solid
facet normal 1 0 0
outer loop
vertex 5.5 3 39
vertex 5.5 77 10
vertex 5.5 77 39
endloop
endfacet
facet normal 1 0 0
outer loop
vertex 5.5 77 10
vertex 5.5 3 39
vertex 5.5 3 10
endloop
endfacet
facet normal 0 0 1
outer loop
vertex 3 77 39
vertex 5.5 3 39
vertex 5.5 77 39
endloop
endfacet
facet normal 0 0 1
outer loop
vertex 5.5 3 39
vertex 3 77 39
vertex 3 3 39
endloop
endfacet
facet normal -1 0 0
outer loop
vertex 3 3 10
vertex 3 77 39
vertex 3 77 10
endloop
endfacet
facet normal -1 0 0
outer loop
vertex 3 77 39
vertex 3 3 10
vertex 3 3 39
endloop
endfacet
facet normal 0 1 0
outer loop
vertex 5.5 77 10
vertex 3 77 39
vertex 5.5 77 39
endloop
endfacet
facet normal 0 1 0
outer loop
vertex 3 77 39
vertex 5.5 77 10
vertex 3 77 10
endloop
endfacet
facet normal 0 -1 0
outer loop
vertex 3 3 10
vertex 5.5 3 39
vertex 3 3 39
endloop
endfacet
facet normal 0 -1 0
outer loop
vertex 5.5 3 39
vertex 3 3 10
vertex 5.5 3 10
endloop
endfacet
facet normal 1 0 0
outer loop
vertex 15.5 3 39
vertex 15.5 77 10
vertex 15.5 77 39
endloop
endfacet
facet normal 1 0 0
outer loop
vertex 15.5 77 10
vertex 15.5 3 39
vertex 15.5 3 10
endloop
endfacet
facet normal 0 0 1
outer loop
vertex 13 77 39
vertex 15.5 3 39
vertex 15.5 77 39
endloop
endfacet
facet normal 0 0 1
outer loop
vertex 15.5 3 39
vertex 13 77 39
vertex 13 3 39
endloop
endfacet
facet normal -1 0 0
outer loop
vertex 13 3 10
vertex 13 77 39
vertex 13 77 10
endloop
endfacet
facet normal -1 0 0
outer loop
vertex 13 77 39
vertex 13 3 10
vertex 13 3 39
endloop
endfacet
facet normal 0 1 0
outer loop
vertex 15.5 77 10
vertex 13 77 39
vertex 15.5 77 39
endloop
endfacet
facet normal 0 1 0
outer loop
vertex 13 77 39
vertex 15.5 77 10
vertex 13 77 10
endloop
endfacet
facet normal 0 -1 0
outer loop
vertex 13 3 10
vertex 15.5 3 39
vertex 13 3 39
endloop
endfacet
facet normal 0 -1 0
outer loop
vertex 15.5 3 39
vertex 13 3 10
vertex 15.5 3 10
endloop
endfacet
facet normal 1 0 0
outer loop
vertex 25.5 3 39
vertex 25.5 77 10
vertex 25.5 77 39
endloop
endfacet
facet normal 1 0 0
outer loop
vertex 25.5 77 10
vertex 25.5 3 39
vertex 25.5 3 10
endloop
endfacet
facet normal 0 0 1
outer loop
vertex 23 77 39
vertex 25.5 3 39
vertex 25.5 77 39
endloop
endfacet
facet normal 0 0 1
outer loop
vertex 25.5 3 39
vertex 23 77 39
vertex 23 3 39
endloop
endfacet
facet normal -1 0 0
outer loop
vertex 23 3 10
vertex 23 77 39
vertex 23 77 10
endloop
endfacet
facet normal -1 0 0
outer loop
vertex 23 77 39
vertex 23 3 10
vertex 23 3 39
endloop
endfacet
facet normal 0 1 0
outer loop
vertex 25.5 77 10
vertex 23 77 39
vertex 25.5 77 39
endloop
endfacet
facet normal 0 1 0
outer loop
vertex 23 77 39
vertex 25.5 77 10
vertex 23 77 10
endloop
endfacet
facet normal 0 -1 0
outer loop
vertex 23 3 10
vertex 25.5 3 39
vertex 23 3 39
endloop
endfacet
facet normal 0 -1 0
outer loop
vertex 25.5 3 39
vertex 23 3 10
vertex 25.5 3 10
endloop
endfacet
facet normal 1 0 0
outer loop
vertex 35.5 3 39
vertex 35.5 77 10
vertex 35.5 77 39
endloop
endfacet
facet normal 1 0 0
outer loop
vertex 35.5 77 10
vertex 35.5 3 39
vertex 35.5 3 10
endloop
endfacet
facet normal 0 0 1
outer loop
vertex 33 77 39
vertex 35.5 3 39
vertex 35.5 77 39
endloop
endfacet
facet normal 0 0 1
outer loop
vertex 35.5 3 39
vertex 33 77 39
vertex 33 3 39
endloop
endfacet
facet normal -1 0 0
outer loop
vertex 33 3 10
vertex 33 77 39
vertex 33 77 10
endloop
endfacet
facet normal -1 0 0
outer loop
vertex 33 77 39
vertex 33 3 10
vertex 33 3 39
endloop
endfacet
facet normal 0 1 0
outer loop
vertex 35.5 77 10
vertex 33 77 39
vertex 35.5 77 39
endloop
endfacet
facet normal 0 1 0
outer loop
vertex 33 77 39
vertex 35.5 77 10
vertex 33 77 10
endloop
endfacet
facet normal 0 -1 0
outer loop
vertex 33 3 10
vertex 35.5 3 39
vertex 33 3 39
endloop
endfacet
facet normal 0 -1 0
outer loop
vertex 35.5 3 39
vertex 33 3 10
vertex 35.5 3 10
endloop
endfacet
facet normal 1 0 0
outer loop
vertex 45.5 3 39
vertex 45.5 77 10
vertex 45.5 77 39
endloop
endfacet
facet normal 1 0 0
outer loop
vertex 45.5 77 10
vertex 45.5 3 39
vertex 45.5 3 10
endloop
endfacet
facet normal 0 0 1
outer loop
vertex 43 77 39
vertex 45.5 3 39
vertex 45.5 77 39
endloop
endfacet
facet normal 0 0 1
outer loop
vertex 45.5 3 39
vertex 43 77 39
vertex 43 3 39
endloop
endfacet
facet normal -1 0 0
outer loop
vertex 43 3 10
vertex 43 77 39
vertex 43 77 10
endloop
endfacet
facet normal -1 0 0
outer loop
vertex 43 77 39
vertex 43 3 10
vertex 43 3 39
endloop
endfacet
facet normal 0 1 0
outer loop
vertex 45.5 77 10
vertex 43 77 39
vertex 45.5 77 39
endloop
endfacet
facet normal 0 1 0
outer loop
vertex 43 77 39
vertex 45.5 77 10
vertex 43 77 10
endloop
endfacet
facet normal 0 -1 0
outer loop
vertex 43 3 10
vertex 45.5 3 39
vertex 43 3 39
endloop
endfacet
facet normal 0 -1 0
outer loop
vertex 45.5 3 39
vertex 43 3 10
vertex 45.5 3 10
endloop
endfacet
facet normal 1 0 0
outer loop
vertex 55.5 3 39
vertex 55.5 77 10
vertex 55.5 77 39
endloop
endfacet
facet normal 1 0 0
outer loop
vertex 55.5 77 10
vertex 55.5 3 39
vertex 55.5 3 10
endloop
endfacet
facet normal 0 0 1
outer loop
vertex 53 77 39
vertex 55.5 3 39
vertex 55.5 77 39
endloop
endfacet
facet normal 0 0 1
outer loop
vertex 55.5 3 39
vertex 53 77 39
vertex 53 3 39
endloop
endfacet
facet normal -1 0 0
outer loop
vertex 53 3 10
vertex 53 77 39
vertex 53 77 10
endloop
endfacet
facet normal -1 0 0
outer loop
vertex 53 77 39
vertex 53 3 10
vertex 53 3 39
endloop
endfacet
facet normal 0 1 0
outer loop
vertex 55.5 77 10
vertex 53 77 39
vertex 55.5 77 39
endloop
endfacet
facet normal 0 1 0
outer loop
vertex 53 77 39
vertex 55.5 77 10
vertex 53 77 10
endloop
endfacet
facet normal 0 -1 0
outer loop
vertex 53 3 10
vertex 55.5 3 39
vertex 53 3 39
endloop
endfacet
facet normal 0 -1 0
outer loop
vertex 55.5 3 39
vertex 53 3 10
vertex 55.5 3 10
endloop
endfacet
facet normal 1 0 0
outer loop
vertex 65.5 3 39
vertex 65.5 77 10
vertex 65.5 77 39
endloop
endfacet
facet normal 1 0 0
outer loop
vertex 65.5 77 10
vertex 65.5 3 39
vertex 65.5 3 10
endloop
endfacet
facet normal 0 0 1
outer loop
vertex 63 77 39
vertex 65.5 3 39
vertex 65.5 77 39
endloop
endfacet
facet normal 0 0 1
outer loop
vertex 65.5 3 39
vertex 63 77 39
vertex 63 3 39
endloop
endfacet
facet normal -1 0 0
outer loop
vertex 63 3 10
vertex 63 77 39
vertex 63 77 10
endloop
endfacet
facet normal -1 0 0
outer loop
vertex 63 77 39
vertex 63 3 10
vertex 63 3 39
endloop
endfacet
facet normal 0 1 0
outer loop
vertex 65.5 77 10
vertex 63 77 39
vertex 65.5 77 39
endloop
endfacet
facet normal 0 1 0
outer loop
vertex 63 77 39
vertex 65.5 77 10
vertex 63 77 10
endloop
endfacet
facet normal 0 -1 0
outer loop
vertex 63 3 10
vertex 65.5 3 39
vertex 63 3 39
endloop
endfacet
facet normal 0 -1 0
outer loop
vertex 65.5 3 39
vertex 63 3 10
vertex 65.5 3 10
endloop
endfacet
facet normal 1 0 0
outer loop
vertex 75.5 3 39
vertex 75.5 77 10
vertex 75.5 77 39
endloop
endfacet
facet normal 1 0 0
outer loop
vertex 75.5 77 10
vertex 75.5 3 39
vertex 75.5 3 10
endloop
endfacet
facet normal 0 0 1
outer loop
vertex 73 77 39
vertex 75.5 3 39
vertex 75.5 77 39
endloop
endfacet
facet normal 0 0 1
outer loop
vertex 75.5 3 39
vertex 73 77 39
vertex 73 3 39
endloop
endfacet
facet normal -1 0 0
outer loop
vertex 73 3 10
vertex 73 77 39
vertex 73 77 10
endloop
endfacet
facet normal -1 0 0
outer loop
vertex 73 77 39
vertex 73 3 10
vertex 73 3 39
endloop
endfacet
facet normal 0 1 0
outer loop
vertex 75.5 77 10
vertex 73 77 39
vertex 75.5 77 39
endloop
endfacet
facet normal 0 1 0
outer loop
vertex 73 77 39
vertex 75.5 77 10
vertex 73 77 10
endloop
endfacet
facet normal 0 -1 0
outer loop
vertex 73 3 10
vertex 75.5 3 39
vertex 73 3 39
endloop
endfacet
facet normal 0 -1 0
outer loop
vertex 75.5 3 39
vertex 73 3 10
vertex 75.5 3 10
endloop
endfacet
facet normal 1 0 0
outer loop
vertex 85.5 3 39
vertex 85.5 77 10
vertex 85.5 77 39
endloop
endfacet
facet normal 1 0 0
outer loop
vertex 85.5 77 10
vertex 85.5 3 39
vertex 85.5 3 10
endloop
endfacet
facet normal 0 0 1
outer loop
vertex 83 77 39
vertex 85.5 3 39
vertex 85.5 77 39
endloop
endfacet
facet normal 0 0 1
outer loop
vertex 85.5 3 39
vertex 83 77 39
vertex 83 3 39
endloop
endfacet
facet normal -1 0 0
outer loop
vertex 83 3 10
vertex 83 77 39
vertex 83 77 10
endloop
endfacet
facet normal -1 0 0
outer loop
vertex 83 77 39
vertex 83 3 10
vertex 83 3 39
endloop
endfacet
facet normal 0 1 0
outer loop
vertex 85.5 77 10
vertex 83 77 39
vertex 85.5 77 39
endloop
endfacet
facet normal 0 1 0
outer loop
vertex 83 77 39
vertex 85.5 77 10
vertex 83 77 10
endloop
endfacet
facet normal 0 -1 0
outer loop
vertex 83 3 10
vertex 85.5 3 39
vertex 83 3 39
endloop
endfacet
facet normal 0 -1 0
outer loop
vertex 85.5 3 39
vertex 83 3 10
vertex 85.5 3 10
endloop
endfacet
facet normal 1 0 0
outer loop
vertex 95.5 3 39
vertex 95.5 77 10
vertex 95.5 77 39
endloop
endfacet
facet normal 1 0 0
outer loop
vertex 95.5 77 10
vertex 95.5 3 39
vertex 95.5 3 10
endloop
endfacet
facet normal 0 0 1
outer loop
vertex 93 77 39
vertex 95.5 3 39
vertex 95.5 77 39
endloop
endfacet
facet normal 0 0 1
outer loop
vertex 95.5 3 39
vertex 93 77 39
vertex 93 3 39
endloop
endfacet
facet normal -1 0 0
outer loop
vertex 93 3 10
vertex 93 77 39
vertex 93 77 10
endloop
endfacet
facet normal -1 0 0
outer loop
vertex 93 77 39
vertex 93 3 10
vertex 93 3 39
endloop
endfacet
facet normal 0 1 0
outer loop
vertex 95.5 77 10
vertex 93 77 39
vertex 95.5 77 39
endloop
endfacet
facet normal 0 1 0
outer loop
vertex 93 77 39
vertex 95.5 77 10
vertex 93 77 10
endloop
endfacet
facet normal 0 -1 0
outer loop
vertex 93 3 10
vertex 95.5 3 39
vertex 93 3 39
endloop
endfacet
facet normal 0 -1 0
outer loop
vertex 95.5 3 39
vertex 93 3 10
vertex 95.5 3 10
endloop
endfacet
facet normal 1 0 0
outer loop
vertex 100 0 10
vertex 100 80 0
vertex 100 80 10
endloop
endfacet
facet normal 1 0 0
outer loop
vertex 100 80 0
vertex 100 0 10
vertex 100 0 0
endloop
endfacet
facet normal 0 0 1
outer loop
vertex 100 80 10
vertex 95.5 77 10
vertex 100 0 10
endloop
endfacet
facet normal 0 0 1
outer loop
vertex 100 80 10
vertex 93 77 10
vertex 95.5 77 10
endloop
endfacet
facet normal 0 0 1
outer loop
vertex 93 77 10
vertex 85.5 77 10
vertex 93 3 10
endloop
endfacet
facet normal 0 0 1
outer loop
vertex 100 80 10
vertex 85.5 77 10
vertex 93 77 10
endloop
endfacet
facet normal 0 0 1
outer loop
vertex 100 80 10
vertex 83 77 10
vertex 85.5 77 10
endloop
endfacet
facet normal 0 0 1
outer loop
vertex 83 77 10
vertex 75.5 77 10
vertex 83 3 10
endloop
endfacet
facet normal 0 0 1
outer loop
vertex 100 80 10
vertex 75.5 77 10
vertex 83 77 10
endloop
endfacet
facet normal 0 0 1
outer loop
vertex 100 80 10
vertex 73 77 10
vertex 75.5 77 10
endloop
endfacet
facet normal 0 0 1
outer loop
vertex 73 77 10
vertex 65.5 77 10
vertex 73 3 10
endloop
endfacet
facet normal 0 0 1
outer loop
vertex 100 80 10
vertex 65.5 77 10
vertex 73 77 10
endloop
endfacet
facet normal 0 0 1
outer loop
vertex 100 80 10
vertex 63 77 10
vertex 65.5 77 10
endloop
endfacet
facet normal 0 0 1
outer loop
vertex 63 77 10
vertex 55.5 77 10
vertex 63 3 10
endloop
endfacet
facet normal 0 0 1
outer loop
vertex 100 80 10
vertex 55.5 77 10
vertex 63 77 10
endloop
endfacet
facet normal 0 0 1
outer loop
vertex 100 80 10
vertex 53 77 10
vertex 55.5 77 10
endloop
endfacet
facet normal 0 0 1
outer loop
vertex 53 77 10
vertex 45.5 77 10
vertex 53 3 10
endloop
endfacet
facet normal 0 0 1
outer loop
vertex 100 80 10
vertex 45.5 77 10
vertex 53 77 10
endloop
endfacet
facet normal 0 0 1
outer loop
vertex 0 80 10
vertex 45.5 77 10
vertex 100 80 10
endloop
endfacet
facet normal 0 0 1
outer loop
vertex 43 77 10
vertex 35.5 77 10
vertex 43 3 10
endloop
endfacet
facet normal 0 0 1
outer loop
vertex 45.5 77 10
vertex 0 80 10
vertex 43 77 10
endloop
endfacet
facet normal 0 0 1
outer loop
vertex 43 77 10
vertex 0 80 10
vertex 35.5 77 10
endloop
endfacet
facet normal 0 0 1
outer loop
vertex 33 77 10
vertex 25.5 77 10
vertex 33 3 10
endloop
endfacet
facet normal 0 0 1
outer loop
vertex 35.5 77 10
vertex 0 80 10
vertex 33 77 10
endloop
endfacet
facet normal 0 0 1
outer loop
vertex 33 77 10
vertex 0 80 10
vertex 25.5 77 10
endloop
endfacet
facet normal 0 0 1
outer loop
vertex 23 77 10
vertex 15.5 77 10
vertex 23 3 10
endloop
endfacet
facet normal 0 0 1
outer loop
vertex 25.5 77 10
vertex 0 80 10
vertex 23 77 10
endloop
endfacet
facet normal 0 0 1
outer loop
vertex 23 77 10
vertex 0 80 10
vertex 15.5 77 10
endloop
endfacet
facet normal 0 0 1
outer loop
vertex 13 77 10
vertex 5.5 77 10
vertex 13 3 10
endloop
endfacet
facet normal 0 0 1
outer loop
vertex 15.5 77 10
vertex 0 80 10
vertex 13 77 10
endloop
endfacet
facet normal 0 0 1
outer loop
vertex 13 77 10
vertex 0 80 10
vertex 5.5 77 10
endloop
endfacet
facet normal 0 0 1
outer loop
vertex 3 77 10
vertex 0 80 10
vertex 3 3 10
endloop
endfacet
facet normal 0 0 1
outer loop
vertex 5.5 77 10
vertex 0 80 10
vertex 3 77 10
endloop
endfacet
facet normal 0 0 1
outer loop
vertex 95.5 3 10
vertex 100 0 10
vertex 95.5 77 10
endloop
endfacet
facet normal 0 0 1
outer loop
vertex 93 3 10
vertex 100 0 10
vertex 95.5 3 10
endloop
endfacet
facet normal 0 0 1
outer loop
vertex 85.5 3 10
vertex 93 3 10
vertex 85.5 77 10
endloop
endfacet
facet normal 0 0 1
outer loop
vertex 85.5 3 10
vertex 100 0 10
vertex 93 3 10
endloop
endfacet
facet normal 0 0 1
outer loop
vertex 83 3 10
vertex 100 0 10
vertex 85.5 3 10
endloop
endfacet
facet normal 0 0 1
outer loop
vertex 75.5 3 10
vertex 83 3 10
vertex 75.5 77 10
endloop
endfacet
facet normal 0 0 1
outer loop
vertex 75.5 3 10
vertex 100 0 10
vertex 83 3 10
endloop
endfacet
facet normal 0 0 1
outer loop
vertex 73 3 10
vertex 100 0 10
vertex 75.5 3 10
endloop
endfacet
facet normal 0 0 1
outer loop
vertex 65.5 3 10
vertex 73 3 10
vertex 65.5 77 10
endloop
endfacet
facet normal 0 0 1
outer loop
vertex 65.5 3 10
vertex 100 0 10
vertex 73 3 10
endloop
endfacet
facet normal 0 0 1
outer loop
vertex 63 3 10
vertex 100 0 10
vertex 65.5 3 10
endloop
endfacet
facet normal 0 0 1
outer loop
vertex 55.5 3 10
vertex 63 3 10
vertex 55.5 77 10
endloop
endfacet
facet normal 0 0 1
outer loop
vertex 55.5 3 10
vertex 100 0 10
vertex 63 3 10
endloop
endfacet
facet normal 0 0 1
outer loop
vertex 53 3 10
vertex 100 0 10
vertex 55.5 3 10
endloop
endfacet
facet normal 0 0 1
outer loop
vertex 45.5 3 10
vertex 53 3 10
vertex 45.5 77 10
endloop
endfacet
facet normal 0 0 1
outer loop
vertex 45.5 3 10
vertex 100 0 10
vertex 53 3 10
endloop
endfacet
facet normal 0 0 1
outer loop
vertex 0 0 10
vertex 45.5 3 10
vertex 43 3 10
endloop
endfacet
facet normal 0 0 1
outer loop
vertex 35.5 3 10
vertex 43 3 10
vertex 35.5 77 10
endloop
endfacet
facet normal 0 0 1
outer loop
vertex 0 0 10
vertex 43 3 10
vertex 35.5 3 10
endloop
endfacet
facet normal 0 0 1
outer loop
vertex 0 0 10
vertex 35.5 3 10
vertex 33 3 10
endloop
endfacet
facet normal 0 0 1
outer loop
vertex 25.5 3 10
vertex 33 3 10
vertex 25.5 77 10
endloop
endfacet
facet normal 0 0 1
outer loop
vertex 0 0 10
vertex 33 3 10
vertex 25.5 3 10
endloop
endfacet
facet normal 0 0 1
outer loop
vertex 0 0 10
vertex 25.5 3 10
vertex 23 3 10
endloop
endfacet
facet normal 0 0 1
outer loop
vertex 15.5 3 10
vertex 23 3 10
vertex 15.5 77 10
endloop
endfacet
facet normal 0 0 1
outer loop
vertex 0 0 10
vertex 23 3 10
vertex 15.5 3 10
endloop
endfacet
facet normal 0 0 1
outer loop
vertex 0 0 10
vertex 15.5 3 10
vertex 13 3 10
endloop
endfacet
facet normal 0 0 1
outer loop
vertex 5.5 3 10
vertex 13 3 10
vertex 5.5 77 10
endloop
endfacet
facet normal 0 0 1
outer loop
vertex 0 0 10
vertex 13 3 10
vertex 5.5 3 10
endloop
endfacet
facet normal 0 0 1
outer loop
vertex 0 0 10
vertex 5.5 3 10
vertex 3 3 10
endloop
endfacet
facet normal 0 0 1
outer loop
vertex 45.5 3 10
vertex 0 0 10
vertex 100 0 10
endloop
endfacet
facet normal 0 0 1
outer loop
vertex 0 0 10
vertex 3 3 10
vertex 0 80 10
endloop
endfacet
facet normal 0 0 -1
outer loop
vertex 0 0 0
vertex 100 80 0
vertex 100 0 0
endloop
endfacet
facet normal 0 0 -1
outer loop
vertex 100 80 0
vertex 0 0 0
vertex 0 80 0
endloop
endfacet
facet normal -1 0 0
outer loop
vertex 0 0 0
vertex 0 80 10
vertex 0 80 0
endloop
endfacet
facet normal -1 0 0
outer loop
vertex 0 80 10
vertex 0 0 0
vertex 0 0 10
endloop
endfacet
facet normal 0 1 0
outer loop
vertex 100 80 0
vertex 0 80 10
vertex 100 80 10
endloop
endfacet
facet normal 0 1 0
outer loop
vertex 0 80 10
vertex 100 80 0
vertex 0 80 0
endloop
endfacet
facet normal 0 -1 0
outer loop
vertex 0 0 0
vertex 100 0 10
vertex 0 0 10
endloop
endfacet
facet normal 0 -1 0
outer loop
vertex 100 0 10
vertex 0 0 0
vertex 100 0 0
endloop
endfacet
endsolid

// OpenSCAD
$fn = 32;

// ----------------------------------------------------------------------
// Heatsink: uniform fin block
// ----------------------------------------------------------------------

// --- parameters (mm) ---
base_l = 100;             // base length, X
base_w = 80;              // base width, Y
base_t = 10;              // base plate thickness
fin_h = 30;               // fin height above the base
fin_t = 2.5;              // fin thickness
edge = 3;                 // margin from the base ends
pitch = 10;               // fin pitch

n_fins = floor((base_l - 2 * edge - fin_t) / pitch) + 1;  // fin count
total_h = base_t + fin_h - 1;  // overall height

union() {
  cube([base_l, base_w, base_t]);
  for (i = [0 : n_fins - 1])
    translate([edge + i * pitch, edge, base_t - 1])
      cube([fin_t, base_w - 2 * edge, fin_h]);
}
